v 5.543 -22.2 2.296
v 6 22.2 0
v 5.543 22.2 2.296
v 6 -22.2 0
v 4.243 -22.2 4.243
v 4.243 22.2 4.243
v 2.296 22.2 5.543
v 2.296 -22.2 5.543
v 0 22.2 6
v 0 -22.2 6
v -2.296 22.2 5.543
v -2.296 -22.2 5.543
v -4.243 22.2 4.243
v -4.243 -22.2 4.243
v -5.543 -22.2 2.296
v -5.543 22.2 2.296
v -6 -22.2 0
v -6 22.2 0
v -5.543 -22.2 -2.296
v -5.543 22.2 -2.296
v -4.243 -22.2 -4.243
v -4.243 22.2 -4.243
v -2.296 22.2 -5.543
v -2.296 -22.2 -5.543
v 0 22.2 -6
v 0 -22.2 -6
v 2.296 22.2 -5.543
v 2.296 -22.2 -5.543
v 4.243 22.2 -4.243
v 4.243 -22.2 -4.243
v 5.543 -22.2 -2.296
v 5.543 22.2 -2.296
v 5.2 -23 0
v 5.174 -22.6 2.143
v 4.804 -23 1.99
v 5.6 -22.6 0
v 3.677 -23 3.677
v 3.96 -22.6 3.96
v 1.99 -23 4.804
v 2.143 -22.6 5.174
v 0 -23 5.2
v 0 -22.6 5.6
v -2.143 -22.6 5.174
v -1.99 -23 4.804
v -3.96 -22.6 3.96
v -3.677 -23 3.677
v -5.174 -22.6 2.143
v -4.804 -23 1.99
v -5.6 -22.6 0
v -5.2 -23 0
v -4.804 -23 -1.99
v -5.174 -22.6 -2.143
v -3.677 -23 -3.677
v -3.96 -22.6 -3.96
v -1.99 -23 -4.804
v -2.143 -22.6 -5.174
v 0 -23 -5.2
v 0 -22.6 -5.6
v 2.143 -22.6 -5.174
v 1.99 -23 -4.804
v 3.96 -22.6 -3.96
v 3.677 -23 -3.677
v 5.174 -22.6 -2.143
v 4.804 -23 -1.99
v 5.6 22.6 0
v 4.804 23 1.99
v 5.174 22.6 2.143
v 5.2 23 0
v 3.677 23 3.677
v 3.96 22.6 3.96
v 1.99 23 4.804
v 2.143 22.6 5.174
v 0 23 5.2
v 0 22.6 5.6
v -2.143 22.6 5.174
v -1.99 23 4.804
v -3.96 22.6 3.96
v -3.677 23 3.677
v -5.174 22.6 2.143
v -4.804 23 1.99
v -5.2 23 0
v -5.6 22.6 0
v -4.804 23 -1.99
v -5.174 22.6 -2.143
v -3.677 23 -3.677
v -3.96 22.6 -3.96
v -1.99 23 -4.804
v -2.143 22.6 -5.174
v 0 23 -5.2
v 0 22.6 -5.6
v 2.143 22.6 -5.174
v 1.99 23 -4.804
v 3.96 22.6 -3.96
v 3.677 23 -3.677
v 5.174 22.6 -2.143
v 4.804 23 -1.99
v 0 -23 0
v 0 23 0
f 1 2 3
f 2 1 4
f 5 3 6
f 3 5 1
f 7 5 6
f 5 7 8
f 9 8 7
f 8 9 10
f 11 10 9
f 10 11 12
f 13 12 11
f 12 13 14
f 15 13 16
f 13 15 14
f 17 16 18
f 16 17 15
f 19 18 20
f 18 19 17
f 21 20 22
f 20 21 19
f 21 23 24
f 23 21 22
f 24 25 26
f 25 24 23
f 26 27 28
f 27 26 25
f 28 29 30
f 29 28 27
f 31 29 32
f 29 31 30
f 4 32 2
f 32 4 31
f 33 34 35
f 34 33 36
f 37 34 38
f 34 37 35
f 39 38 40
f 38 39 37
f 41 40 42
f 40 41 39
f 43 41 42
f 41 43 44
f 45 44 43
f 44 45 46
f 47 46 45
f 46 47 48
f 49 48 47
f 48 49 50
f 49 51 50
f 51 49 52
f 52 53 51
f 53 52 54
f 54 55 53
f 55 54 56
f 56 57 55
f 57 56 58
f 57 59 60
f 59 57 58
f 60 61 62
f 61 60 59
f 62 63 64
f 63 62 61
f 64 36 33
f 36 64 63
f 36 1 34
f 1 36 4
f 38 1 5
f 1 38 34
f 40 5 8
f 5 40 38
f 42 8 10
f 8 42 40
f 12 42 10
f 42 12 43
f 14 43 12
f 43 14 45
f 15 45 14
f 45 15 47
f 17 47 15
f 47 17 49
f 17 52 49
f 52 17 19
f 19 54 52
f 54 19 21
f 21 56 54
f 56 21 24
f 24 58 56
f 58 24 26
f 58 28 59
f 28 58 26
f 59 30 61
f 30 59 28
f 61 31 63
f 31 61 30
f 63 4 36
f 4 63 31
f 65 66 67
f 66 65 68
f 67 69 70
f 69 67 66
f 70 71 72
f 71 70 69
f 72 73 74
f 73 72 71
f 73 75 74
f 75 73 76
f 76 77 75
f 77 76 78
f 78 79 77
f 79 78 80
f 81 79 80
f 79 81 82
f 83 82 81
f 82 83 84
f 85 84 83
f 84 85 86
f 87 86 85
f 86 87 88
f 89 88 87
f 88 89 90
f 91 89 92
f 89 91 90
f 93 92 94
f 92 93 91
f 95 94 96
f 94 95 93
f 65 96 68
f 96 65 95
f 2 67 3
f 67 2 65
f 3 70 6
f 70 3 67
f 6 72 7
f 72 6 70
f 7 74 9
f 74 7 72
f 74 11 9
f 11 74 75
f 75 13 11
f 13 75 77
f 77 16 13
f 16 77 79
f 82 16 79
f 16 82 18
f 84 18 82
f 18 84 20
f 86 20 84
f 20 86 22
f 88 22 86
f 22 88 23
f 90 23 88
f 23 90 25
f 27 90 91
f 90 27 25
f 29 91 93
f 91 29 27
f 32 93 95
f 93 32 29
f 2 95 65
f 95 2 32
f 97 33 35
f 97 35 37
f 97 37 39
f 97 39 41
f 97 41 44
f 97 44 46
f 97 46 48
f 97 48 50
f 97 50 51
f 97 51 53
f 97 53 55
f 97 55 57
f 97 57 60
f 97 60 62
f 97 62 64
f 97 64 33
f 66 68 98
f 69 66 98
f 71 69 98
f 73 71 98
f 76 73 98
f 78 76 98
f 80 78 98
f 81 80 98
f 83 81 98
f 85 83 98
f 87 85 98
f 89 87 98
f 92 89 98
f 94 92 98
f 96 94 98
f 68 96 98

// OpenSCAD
// file: ../p/4-4cyli.scad
use <../lib.scad>
function ldraw_lib__4_4cyli() = [
// 0 Cylinder 1.0
// 0 Name: 4-4cyli.dat
// 0 Author: James Jessiman
// 0 !LDRAW_ORG Primitive UPDATE 2005-01
// 0 !LICENSE Licensed under CC BY 2.0 and CC BY 4.0 : see CAreadme.txt
// 
// 0 BFC CERTIFY CCW
  [0,"BFC","CERTIFY"],
  [0,"BFC","CCW"],
// 
// 0 !HISTORY 1998-12-15 [PTadmin] Official Update 1998-10
// 0 !HISTORY 2002-03-23 [sbliss] Added BFC statement; merged headers from files in distributions LDraw 0.27 and Complete.
// 0 !HISTORY 2002-04-25 [PTadmin] Official Update 2002-02
// 0 !HISTORY 2004-12-14 [guyvivan] BFC CCW
// 0 !HISTORY 2005-12-28 [PTadmin] Official Update 2005-01
// 0 !HISTORY 2007-06-24 [PTadmin] Header formatted for Contributor Agreement
// 0 !HISTORY 2008-07-01 [PTadmin] Official Update 2008-01
// 
// 
// 4 16 1 1 0 0.9239 1 0.3827 0.9239 0 0.3827 1 0 0
  [4,16,1,1,0,0.9239,1,0.3827,0.9239,0,0.3827,1,0,0],
// 5 24 1 0 0 1 1 0 0.9239 0 0.3827 0.9239 0 -0.3827
  [5,24,1,0,0,1,1,0,0.9239,0,0.3827,0.9239,0,-0.3827],
// 4 16 0.9239 1 0.3827 0.7071 1 0.7071 0.7071 0 0.7071 0.9239 0 0.3827
  [4,16,0.9239,1,0.3827,0.7071,1,0.7071,0.7071,0,0.7071,0.9239,0,0.3827],
// 5 24 0.9239 0 0.3827 0.9239 1 0.3827 0.7071 0 0.7071 1 0 0
  [5,24,0.9239,0,0.3827,0.9239,1,0.3827,0.7071,0,0.7071,1,0,0],
// 4 16 0.7071 1 0.7071 0.3827 1 0.9239 0.3827 0 0.9239 0.7071 0 0.7071
  [4,16,0.7071,1,0.7071,0.3827,1,0.9239,0.3827,0,0.9239,0.7071,0,0.7071],
// 5 24 0.7071 0 0.7071 0.7071 1 0.7071 0.3827 0 0.9239 0.9239 0 0.3827
  [5,24,0.7071,0,0.7071,0.7071,1,0.7071,0.3827,0,0.9239,0.9239,0,0.3827],
// 4 16 0.3827 1 0.9239 0 1 1 0 0 1 0.3827 0 0.9239
  [4,16,0.3827,1,0.9239,0,1,1,0,0,1,0.3827,0,0.9239],
// 5 24 0.3827 0 0.9239 0.3827 1 0.9239 0 0 1 0.7071 0 0.7071
  [5,24,0.3827,0,0.9239,0.3827,1,0.9239,0,0,1,0.7071,0,0.7071],
// 4 16 0 1 1 -0.3827 1 0.9239 -0.3827 0 0.9239 0 0 1
  [4,16,0,1,1,-0.3827,1,0.9239,-0.3827,0,0.9239,0,0,1],
// 5 24 0 0 1 0 1 1 -0.3827 0 0.9239 0.3827 0 0.9239
  [5,24,0,0,1,0,1,1,-0.3827,0,0.9239,0.3827,0,0.9239],
// 4 16 -0.3827 1 0.9239 -0.7071 1 0.7071 -0.7071 0 0.7071 -0.3827 0 0.9239
  [4,16,-0.3827,1,0.9239,-0.7071,1,0.7071,-0.7071,0,0.7071,-0.3827,0,0.9239],
// 5 24 -0.3827 0 0.9239 -0.3827 1 0.9239 -0.7071 0 0.7071 0 0 1
  [5,24,-0.3827,0,0.9239,-0.3827,1,0.9239,-0.7071,0,0.7071,0,0,1],
// 4 16 -0.7071 1 0.7071 -0.9239 1 0.3827 -0.9239 0 0.3827 -0.7071 0 0.7071
  [4,16,-0.7071,1,0.7071,-0.9239,1,0.3827,-0.9239,0,0.3827,-0.7071,0,0.7071],
// 5 24 -0.7071 0 0.7071 -0.7071 1 0.7071 -0.9239 0 0.3827 -0.3827 0 0.9239
  [5,24,-0.7071,0,0.7071,-0.7071,1,0.7071,-0.9239,0,0.3827,-0.3827,0,0.9239],
// 4 16 -0.9239 1 0.3827 -1 1 0 -1 0 0 -0.9239 0 0.3827
  [4,16,-0.9239,1,0.3827,-1,1,0,-1,0,0,-0.9239,0,0.3827],
// 5 24 -0.9239 0 0.3827 -0.9239 1 0.3827 -1 0 0 -0.7071 0 0.7071
  [5,24,-0.9239,0,0.3827,-0.9239,1,0.3827,-1,0,0,-0.7071,0,0.7071],
// 4 16 -1 1 0 -0.9239 1 -0.3827 -0.9239 0 -0.3827 -1 0 0
  [4,16,-1,1,0,-0.9239,1,-0.3827,-0.9239,0,-0.3827,-1,0,0],
// 5 24 -1 0 0 -1 1 0 -0.9239 0 -0.3827 -0.9239 0 0.3827
  [5,24,-1,0,0,-1,1,0,-0.9239,0,-0.3827,-0.9239,0,0.3827],
// 4 16 -0.9239 1 -0.3827 -0.7071 1 -0.7071 -0.7071 0 -0.7071 -0.9239 0 -0.3827
  [4,16,-0.9239,1,-0.3827,-0.7071,1,-0.7071,-0.7071,0,-0.7071,-0.9239,0,-0.3827],
// 5 24 -0.9239 0 -0.3827 -0.9239 1 -0.3827 -0.7071 0 -0.7071 -1 0 0
  [5,24,-0.9239,0,-0.3827,-0.9239,1,-0.3827,-0.7071,0,-0.7071,-1,0,0],
// 4 16 -0.7071 1 -0.7071 -0.3827 1 -0.9239 -0.3827 0 -0.9239 -0.7071 0 -0.7071
  [4,16,-0.7071,1,-0.7071,-0.3827,1,-0.9239,-0.3827,0,-0.9239,-0.7071,0,-0.7071],
// 5 24 -0.7071 0 -0.7071 -0.7071 1 -0.7071 -0.3827 0 -0.9239 -0.9239 0 -0.3827
  [5,24,-0.7071,0,-0.7071,-0.7071,1,-0.7071,-0.3827,0,-0.9239,-0.9239,0,-0.3827],
// 4 16 -0.3827 1 -0.9239 0 1 -1 0 0 -1 -0.3827 0 -0.9239
  [4,16,-0.3827,1,-0.9239,0,1,-1,0,0,-1,-0.3827,0,-0.9239],
// 5 24 -0.3827 0 -0.9239 -0.3827 1 -0.9239 0 0 -1 -0.7071 0 -0.7071
  [5,24,-0.3827,0,-0.9239,-0.3827,1,-0.9239,0,0,-1,-0.7071,0,-0.7071],
// 4 16 0 1 -1 0.3827 1 -0.9239 0.3827 0 -0.9239 0 0 -1
  [4,16,0,1,-1,0.3827,1,-0.9239,0.3827,0,-0.9239,0,0,-1],
// 5 24 0 0 -1 0 1 -1 0.3827 0 -0.9239 -0.3827 0 -0.9239
  [5,24,0,0,-1,0,1,-1,0.3827,0,-0.9239,-0.3827,0,-0.9239],
// 4 16 0.3827 1 -0.9239 0.7071 1 -0.7071 0.7071 0 -0.7071 0.3827 0 -0.9239
  [4,16,0.3827,1,-0.9239,0.7071,1,-0.7071,0.7071,0,-0.7071,0.3827,0,-0.9239],
// 5 24 0.3827 0 -0.9239 0.3827 1 -0.9239 0.7071 0 -0.7071 0 0 -1
  [5,24,0.3827,0,-0.9239,0.3827,1,-0.9239,0.7071,0,-0.7071,0,0,-1],
// 4 16 0.7071 1 -0.7071 0.9239 1 -0.3827 0.9239 0 -0.3827 0.7071 0 -0.7071
  [4,16,0.7071,1,-0.7071,0.9239,1,-0.3827,0.9239,0,-0.3827,0.7071,0,-0.7071],
// 5 24 0.7071 0 -0.7071 0.7071 1 -0.7071 0.9239 0 -0.3827 0.3827 0 -0.9239
  [5,24,0.7071,0,-0.7071,0.7071,1,-0.7071,0.9239,0,-0.3827,0.3827,0,-0.9239],
// 4 16 0.9239 1 -0.3827 1 1 0 1 0 0 0.9239 0 -0.3827
  [4,16,0.9239,1,-0.3827,1,1,0,1,0,0,0.9239,0,-0.3827],
// 5 24 0.9239 0 -0.3827 0.9239 1 -0.3827 1 0 0 0.7071 0 -0.7071
  [5,24,0.9239,0,-0.3827,0.9239,1,-0.3827,1,0,0,0.7071,0,-0.7071],
// 0
];
module ldraw_lib__4_4cyli(step=0, col=false, unit=2/5, alt=false, line=0.2, solid=!$preview)
    makepoly(ldraw_lib__4_4cyli(), step=step, col=col, unit=unit, alt=alt, line=line, solid=solid);
ldraw_lib__4_4cyli(line=0.2);
// file: ../p/4-4edge.scad
use <../lib.scad>
function ldraw_lib__4_4edge() = [
// 0 Circle 1.0
// 0 Name: 4-4edge.dat
// 0 Author: James Jessiman
// 0 !LDRAW_ORG Primitive UPDATE 2017-01
// 0 !LICENSE Licensed under CC BY 2.0 and CC BY 4.0 : see CAreadme.txt
// 
// 0 BFC CERTIFY CCW
  [0,"BFC","CERTIFY"],
  [0,"BFC","CCW"],
// 
// 0 !HISTORY 1998-12-15 [PTadmin] Official Update 1998-10
// 0 !HISTORY 2005-12-28 [PTadmin] Official Update 2005-01
// 0 !HISTORY 2007-06-24 [PTadmin] Header formatted for Contributor Agreement
// 0 !HISTORY 2008-07-01 [PTadmin] Official Update 2008-01
// 0 !HISTORY 2017-01-15 [Steffen] BFCed
// 0 !HISTORY 2017-12-30 [PTadmin] Official Update 2017-01
// 
// 
// 2 24 1 0 0 0.9239 0 0.3827
  [2,24,1,0,0,0.9239,0,0.3827],
// 2 24 0.9239 0 0.3827 0.7071 0 0.7071
  [2,24,0.9239,0,0.3827,0.7071,0,0.7071],
// 2 24 0.7071 0 0.7071 0.3827 0 0.9239
  [2,24,0.7071,0,0.7071,0.3827,0,0.9239],
// 2 24 0.3827 0 0.9239 0 0 1
  [2,24,0.3827,0,0.9239,0,0,1],
// 2 24 0 0 1 -0.3827 0 0.9239
  [2,24,0,0,1,-0.3827,0,0.9239],
// 2 24 -0.3827 0 0.9239 -0.7071 0 0.7071
  [2,24,-0.3827,0,0.9239,-0.7071,0,0.7071],
// 2 24 -0.7071 0 0.7071 -0.9239 0 0.3827
  [2,24,-0.7071,0,0.7071,-0.9239,0,0.3827],
// 2 24 -0.9239 0 0.3827 -1 0 -0
  [2,24,-0.9239,0,0.3827,-1,0,-0],
// 2 24 -1 0 -0 -0.9239 0 -0.3827
  [2,24,-1,0,-0,-0.9239,0,-0.3827],
// 2 24 -0.9239 0 -0.3827 -0.7071 0 -0.7071
  [2,24,-0.9239,0,-0.3827,-0.7071,0,-0.7071],
// 2 24 -0.7071 0 -0.7071 -0.3827 0 -0.9239
  [2,24,-0.7071,0,-0.7071,-0.3827,0,-0.9239],
// 2 24 -0.3827 0 -0.9239 0 0 -1
  [2,24,-0.3827,0,-0.9239,0,0,-1],
// 2 24 0 0 -1 0.3827 0 -0.9239
  [2,24,0,0,-1,0.3827,0,-0.9239],
// 2 24 0.3827 0 -0.9239 0.7071 0 -0.7071
  [2,24,0.3827,0,-0.9239,0.7071,0,-0.7071],
// 2 24 0.7071 0 -0.7071 0.9239 0 -0.3827
  [2,24,0.7071,0,-0.7071,0.9239,0,-0.3827],
// 2 24 0.9239 0 -0.3827 1 0 0
  [2,24,0.9239,0,-0.3827,1,0,0],
];
module ldraw_lib__4_4edge(step=0, col=false, unit=2/5, alt=false, line=0.2, solid=!$preview)
    makepoly(ldraw_lib__4_4edge(), step=step, col=col, unit=unit, alt=alt, line=line, solid=solid);
ldraw_lib__4_4edge(line=0.2);
// file: ../p/4-4disc.scad
use <../lib.scad>
function ldraw_lib__4_4disc() = [
// 0 Disc 1.0
// 0 Name: 4-4disc.dat
// 0 Author: James Jessiman
// 0 !LDRAW_ORG Primitive UPDATE 2002-02
// 0 !LICENSE Licensed under CC BY 2.0 and CC BY 4.0 : see CAreadme.txt
// 
// 0 BFC CERTIFY CCW
  [0,"BFC","CERTIFY"],
  [0,"BFC","CCW"],
// 
// 0 !HISTORY 1998-12-15 [PTadmin] Official Update 1998-10
// 0 !HISTORY 2002-03-23 [sbliss] Added BFC statement
// 0 !HISTORY 2002-04-25 [PTadmin] Official Update 2002-02
// 0 !HISTORY 2007-06-24 [PTadmin] Header formatted for Contributor Agreement
// 0 !HISTORY 2008-07-01 [PTadmin] Official Update 2008-01
// 
// 
// 3 16 0 0 0 1 0 0 0.9239 0 0.3827
  [3,16,0,0,0,1,0,0,0.9239,0,0.3827],
// 3 16 0 0 0 0.9239 0 0.3827 0.7071 0 0.7071
  [3,16,0,0,0,0.9239,0,0.3827,0.7071,0,0.7071],
// 3 16 0 0 0 0.7071 0 0.7071 0.3827 0 0.9239
  [3,16,0,0,0,0.7071,0,0.7071,0.3827,0,0.9239],
// 3 16 0 0 0 0.3827 0 0.9239 0 0 1
  [3,16,0,0,0,0.3827,0,0.9239,0,0,1],
// 3 16 0 0 0 0 0 1 -0.3827 0 0.9239
  [3,16,0,0,0,0,0,1,-0.3827,0,0.9239],
// 3 16 0 0 0 -0.3827 0 0.9239 -0.7071 0 0.7071
  [3,16,0,0,0,-0.3827,0,0.9239,-0.7071,0,0.7071],
// 3 16 0 0 0 -0.7071 0 0.7071 -0.9239 0 0.3827
  [3,16,0,0,0,-0.7071,0,0.7071,-0.9239,0,0.3827],
// 3 16 0 0 0 -0.9239 0 0.3827 -1 0 -0
  [3,16,0,0,0,-0.9239,0,0.3827,-1,0,-0],
// 3 16 0 0 0 -1 0 -0 -0.9239 0 -0.3827
  [3,16,0,0,0,-1,0,-0,-0.9239,0,-0.3827],
// 3 16 0 0 0 -0.9239 0 -0.3827 -0.7071 0 -0.7071
  [3,16,0,0,0,-0.9239,0,-0.3827,-0.7071,0,-0.7071],
// 3 16 0 0 0 -0.7071 0 -0.7071 -0.3827 0 -0.9239
  [3,16,0,0,0,-0.7071,0,-0.7071,-0.3827,0,-0.9239],
// 3 16 0 0 0 -0.3827 0 -0.9239 0 0 -1
  [3,16,0,0,0,-0.3827,0,-0.9239,0,0,-1],
// 3 16 0 0 0 0 0 -1 0.3827 0 -0.9239
  [3,16,0,0,0,0,0,-1,0.3827,0,-0.9239],
// 3 16 0 0 0 0.3827 0 -0.9239 0.7071 0 -0.7071
  [3,16,0,0,0,0.3827,0,-0.9239,0.7071,0,-0.7071],
// 3 16 0 0 0 0.7071 0 -0.7071 0.9239 0 -0.3827
  [3,16,0,0,0,0.7071,0,-0.7071,0.9239,0,-0.3827],
// 3 16 0 0 0 0.9239 0 -0.3827 1 0 0
  [3,16,0,0,0,0.9239,0,-0.3827,1,0,0],
// 0
];
module ldraw_lib__4_4disc(step=0, col=false, unit=2/5, alt=false, line=0.2, solid=!$preview)
    makepoly(ldraw_lib__4_4disc(), step=step, col=col, unit=unit, alt=alt, line=line, solid=solid);
ldraw_lib__4_4disc(line=0.2);
// file: ../p/4-4cylo.scad
use <../lib.scad>
use <4-4cyli.scad>
use <4-4edge.scad>
function ldraw_lib__4_4cylo() = [
// 0 Cylinder Open 1.0
// 0 Name: 4-4cylo.dat
// 0 Author: Mark Kennedy [mkennedy]
// 0 !LDRAW_ORG Primitive UPDATE 2010-01
// 0 !LICENSE Licensed under CC BY 2.0 and CC BY 4.0 : see CAreadme.txt
// 
// 0 BFC CERTIFY CCW
  [0,"BFC","CERTIFY"],
  [0,"BFC","CCW"],
// 
// 0 !HISTORY 2010-04-05 [PTadmin] Official Update 2010-01
// 
// 
// 1 16 0 0 0 1 0 0 0 1 0 0 0 1 4-4edge.dat
  [1,16,0,0,0,1,0,0,0,1,0,0,0,1, ldraw_lib__4_4edge()],
// 1 16 0 1 0 1 0 0 0 1 0 0 0 1 4-4edge.dat
  [1,16,0,1,0,1,0,0,0,1,0,0,0,1, ldraw_lib__4_4edge()],
// 1 16 0 0 0 1 0 0 0 1 0 0 0 1 4-4cyli.dat
  [1,16,0,0,0,1,0,0,0,1,0,0,0,1, ldraw_lib__4_4cyli()],
// 0
];
module ldraw_lib__4_4cylo(step=0, col=false, unit=2/5, alt=false, line=0.2, solid=!$preview)
    makepoly(ldraw_lib__4_4cylo(), step=step, col=col, unit=unit, alt=alt, line=line, solid=solid);
ldraw_lib__4_4cylo(line=0.2);
// file: ../p/4-4con14.scad
use <../lib.scad>
function ldraw_lib__4_4con14() = [
// 0 Cone 14 x 1.0
// 0 Name: 4-4con14.dat
// 0 Author: Niels Karsdorp [nielsk]
// 0 !LDRAW_ORG Primitive UPDATE 2010-02
// 0 !LICENSE Licensed under CC BY 2.0 and CC BY 4.0 : see CAreadme.txt
// 
// 0 BFC CERTIFY CCW
  [0,"BFC","CERTIFY"],
  [0,"BFC","CCW"],
// 
// 0 !HISTORY 2010-07-05 [PTadmin] Official Update 2010-02
// 
// 
// 5 24 14.0000 1 0.0000 15.0000 0 0.0000 12.9346 1 5.3578 12.9346 1 -5.3578
  [5,24,14.0000,1,0.0000,15.0000,0,0.0000,12.9346,1,5.3578,12.9346,1,-5.3578],
// 5 24 12.9346 1 5.3578 13.8585 0 5.7405 9.8994 1 9.8994 14.0000 1 0.0000
  [5,24,12.9346,1,5.3578,13.8585,0,5.7405,9.8994,1,9.8994,14.0000,1,0.0000],
// 5 24 9.8994 1 9.8994 10.6065 0 10.6065 5.3578 1 12.9346 12.9346 1 5.3578
  [5,24,9.8994,1,9.8994,10.6065,0,10.6065,5.3578,1,12.9346,12.9346,1,5.3578],
// 5 24 5.3578 1 12.9346 5.7405 0 13.8585 0.0000 1 14.0000 9.8994 1 9.8994
  [5,24,5.3578,1,12.9346,5.7405,0,13.8585,0.0000,1,14.0000,9.8994,1,9.8994],
// 5 24 0.0000 1 14.0000 0.0000 0 15.0000 -5.3578 1 12.9346 5.3578 1 12.9346
  [5,24,0.0000,1,14.0000,0.0000,0,15.0000,-5.3578,1,12.9346,5.3578,1,12.9346],
// 5 24 -5.3578 1 12.9346 -5.7405 0 13.8585 -9.8994 1 9.8994 0.0000 1 14.0000
  [5,24,-5.3578,1,12.9346,-5.7405,0,13.8585,-9.8994,1,9.8994,0.0000,1,14.0000],
// 5 24 -9.8994 1 9.8994 -10.6065 0 10.6065 -12.9346 1 5.3578 -5.3578 1 12.9346
  [5,24,-9.8994,1,9.8994,-10.6065,0,10.6065,-12.9346,1,5.3578,-5.3578,1,12.9346],
// 5 24 -12.9346 1 5.3578 -13.8585 0 5.7405 -14.0000 1 0.0000 -9.8994 1 9.8994
  [5,24,-12.9346,1,5.3578,-13.8585,0,5.7405,-14.0000,1,0.0000,-9.8994,1,9.8994],
// 5 24 -14.0000 1 0.0000 -15.0000 0 0.0000 -12.9346 1 -5.3578 -12.9346 1 5.3578
  [5,24,-14.0000,1,0.0000,-15.0000,0,0.0000,-12.9346,1,-5.3578,-12.9346,1,5.3578],
// 5 24 -12.9346 1 -5.3578 -13.8585 0 -5.7405 -9.8994 1 -9.8994 -14.0000 1 0.0000
  [5,24,-12.9346,1,-5.3578,-13.8585,0,-5.7405,-9.8994,1,-9.8994,-14.0000,1,0.0000],
// 5 24 -9.8994 1 -9.8994 -10.6065 0 -10.6065 -5.3578 1 -12.9346 -12.9346 1 -5.3578
  [5,24,-9.8994,1,-9.8994,-10.6065,0,-10.6065,-5.3578,1,-12.9346,-12.9346,1,-5.3578],
// 5 24 -5.3578 1 -12.9346 -5.7405 0 -13.8585 0.0000 1 -14.0000 -9.8994 1 -9.8994
  [5,24,-5.3578,1,-12.9346,-5.7405,0,-13.8585,0.0000,1,-14.0000,-9.8994,1,-9.8994],
// 5 24 0.0000 1 -14.0000 0.0000 0 -15.0000 5.3578 1 -12.9346 -5.3578 1 -12.9346
  [5,24,0.0000,1,-14.0000,0.0000,0,-15.0000,5.3578,1,-12.9346,-5.3578,1,-12.9346],
// 5 24 5.3578 1 -12.9346 5.7405 0 -13.8585 9.8994 1 -9.8994 0.0000 1 -14.0000
  [5,24,5.3578,1,-12.9346,5.7405,0,-13.8585,9.8994,1,-9.8994,0.0000,1,-14.0000],
// 5 24 9.8994 1 -9.8994 10.6065 0 -10.6065 12.9346 1 -5.3578 5.3578 1 -12.9346
  [5,24,9.8994,1,-9.8994,10.6065,0,-10.6065,12.9346,1,-5.3578,5.3578,1,-12.9346],
// 5 24 12.9346 1 -5.3578 13.8585 0 -5.7405 14.0000 1 0.0000 9.8994 1 -9.8994
  [5,24,12.9346,1,-5.3578,13.8585,0,-5.7405,14.0000,1,0.0000,9.8994,1,-9.8994],
// 
// 4 16 14.0000 1 0.0000 12.9346 1 5.3578 13.8585 0 5.7405 15.0000 0 0.0000
  [4,16,14.0000,1,0.0000,12.9346,1,5.3578,13.8585,0,5.7405,15.0000,0,0.0000],
// 4 16 12.9346 1 5.3578 9.8994 1 9.8994 10.6065 0 10.6065 13.8585 0 5.7405
  [4,16,12.9346,1,5.3578,9.8994,1,9.8994,10.6065,0,10.6065,13.8585,0,5.7405],
// 4 16 9.8994 1 9.8994 5.3578 1 12.9346 5.7405 0 13.8585 10.6065 0 10.6065
  [4,16,9.8994,1,9.8994,5.3578,1,12.9346,5.7405,0,13.8585,10.6065,0,10.6065],
// 4 16 5.3578 1 12.9346 0.0000 1 14.0000 0.0000 0 15.0000 5.7405 0 13.8585
  [4,16,5.3578,1,12.9346,0.0000,1,14.0000,0.0000,0,15.0000,5.7405,0,13.8585],
// 4 16 0.0000 1 14.0000 -5.3578 1 12.9346 -5.7405 0 13.8585 0.0000 0 15.0000
  [4,16,0.0000,1,14.0000,-5.3578,1,12.9346,-5.7405,0,13.8585,0.0000,0,15.0000],
// 4 16 -5.3578 1 12.9346 -9.8994 1 9.8994 -10.6065 0 10.6065 -5.7405 0 13.8585
  [4,16,-5.3578,1,12.9346,-9.8994,1,9.8994,-10.6065,0,10.6065,-5.7405,0,13.8585],
// 4 16 -9.8994 1 9.8994 -12.9346 1 5.3578 -13.8585 0 5.7405 -10.6065 0 10.6065
  [4,16,-9.8994,1,9.8994,-12.9346,1,5.3578,-13.8585,0,5.7405,-10.6065,0,10.6065],
// 4 16 -12.9346 1 5.3578 -14.0000 1 0.0000 -15.0000 0 0.0000 -13.8585 0 5.7405
  [4,16,-12.9346,1,5.3578,-14.0000,1,0.0000,-15.0000,0,0.0000,-13.8585,0,5.7405],
// 4 16 -14.0000 1 0.0000 -12.9346 1 -5.3578 -13.8585 0 -5.7405 -15.0000 0 0.0000
  [4,16,-14.0000,1,0.0000,-12.9346,1,-5.3578,-13.8585,0,-5.7405,-15.0000,0,0.0000],
// 4 16 -12.9346 1 -5.3578 -9.8994 1 -9.8994 -10.6065 0 -10.6065 -13.8585 0 -5.7405
  [4,16,-12.9346,1,-5.3578,-9.8994,1,-9.8994,-10.6065,0,-10.6065,-13.8585,0,-5.7405],
// 4 16 -9.8994 1 -9.8994 -5.3578 1 -12.9346 -5.7405 0 -13.8585 -10.6065 0 -10.6065
  [4,16,-9.8994,1,-9.8994,-5.3578,1,-12.9346,-5.7405,0,-13.8585,-10.6065,0,-10.6065],
// 4 16 -5.3578 1 -12.9346 0.0000 1 -14.0000 0.0000 0 -15.0000 -5.7405 0 -13.8585
  [4,16,-5.3578,1,-12.9346,0.0000,1,-14.0000,0.0000,0,-15.0000,-5.7405,0,-13.8585],
// 4 16 0.0000 1 -14.0000 5.3578 1 -12.9346 5.7405 0 -13.8585 0.0000 0 -15.0000
  [4,16,0.0000,1,-14.0000,5.3578,1,-12.9346,5.7405,0,-13.8585,0.0000,0,-15.0000],
// 4 16 5.3578 1 -12.9346 9.8994 1 -9.8994 10.6065 0 -10.6065 5.7405 0 -13.8585
  [4,16,5.3578,1,-12.9346,9.8994,1,-9.8994,10.6065,0,-10.6065,5.7405,0,-13.8585],
// 4 16 9.8994 1 -9.8994 12.9346 1 -5.3578 13.8585 0 -5.7405 10.6065 0 -10.6065
  [4,16,9.8994,1,-9.8994,12.9346,1,-5.3578,13.8585,0,-5.7405,10.6065,0,-10.6065],
// 4 16 12.9346 1 -5.3578 14.0000 1 0.0000 15.0000 0 0.0000 13.8585 0 -5.7405
  [4,16,12.9346,1,-5.3578,14.0000,1,0.0000,15.0000,0,0.0000,13.8585,0,-5.7405],
// 
// 0
];
module ldraw_lib__4_4con14(step=0, col=false, unit=2/5, alt=false, line=0.2, solid=!$preview)
    makepoly(ldraw_lib__4_4con14(), step=step, col=col, unit=unit, alt=alt, line=line, solid=solid);
ldraw_lib__4_4con14(line=0.2);
// file: ../p/4-4con13.scad
use <../lib.scad>
function ldraw_lib__4_4con13() = [
// 0 Cone 13 x 1.0
// 0 Name: 4-4con13.dat
// 0 Author: Michael Heidemann [mikeheide]
// 0 !LDRAW_ORG Primitive UPDATE 2010-02
// 0 !LICENSE Licensed under CC BY 2.0 and CC BY 4.0 : see CAreadme.txt
// 
// 0 BFC CERTIFY CCW
  [0,"BFC","CERTIFY"],
  [0,"BFC","CCW"],
// 
// 0 !HISTORY 2010-07-05 [PTadmin] Official Update 2010-02
// 
// 
// 4 16 13 1 0 12.0107 1 4.9751 12.9346 0 5.3578 14 0 0
  [4,16,13,1,0,12.0107,1,4.9751,12.9346,0,5.3578,14,0,0],
// 4 16 12.0107 1 4.9751 9.1923 1 9.1923 9.8994 0 9.8994 12.9346 0 5.3578
  [4,16,12.0107,1,4.9751,9.1923,1,9.1923,9.8994,0,9.8994,12.9346,0,5.3578],
// 4 16 9.1923 1 9.1923 4.9751 1 12.0107 5.3578 0 12.9346 9.8994 0 9.8994
  [4,16,9.1923,1,9.1923,4.9751,1,12.0107,5.3578,0,12.9346,9.8994,0,9.8994],
// 4 16 4.9751 1 12.0107 0 1 13 0 0 14 5.3578 0 12.9346
  [4,16,4.9751,1,12.0107,0,1,13,0,0,14,5.3578,0,12.9346],
// 4 16 0 1 13 -4.9751 1 12.0107 -5.3578 0 12.9346 0 0 14
  [4,16,0,1,13,-4.9751,1,12.0107,-5.3578,0,12.9346,0,0,14],
// 4 16 -4.9751 1 12.0107 -9.1923 1 9.1923 -9.8994 0 9.8994 -5.3578 0 12.9346
  [4,16,-4.9751,1,12.0107,-9.1923,1,9.1923,-9.8994,0,9.8994,-5.3578,0,12.9346],
// 4 16 -9.1923 1 9.1923 -12.0107 1 4.9751 -12.9346 0 5.3578 -9.8994 0 9.8994
  [4,16,-9.1923,1,9.1923,-12.0107,1,4.9751,-12.9346,0,5.3578,-9.8994,0,9.8994],
// 4 16 -12.0107 1 4.9751 -13 1 0 -14 0 0 -12.9346 0 5.3578
  [4,16,-12.0107,1,4.9751,-13,1,0,-14,0,0,-12.9346,0,5.3578],
// 4 16 -13 1 0 -12.0107 1 -4.9751 -12.9346 0 -5.3578 -14 0 0
  [4,16,-13,1,0,-12.0107,1,-4.9751,-12.9346,0,-5.3578,-14,0,0],
// 4 16 -12.0107 1 -4.9751 -9.1923 1 -9.1923 -9.8994 0 -9.8994 -12.9346 0 -5.3578
  [4,16,-12.0107,1,-4.9751,-9.1923,1,-9.1923,-9.8994,0,-9.8994,-12.9346,0,-5.3578],
// 4 16 -9.1923 1 -9.1923 -4.9751 1 -12.0107 -5.3578 0 -12.9346 -9.8994 0 -9.8994
  [4,16,-9.1923,1,-9.1923,-4.9751,1,-12.0107,-5.3578,0,-12.9346,-9.8994,0,-9.8994],
// 4 16 -4.9751 1 -12.0107 0 1 -13 0 0 -14 -5.3578 0 -12.9346
  [4,16,-4.9751,1,-12.0107,0,1,-13,0,0,-14,-5.3578,0,-12.9346],
// 4 16 0 1 -13 4.9751 1 -12.0107 5.3578 0 -12.9346 0 0 -14
  [4,16,0,1,-13,4.9751,1,-12.0107,5.3578,0,-12.9346,0,0,-14],
// 4 16 4.9751 1 -12.0107 9.1923 1 -9.1923 9.8994 0 -9.8994 5.3578 0 -12.9346
  [4,16,4.9751,1,-12.0107,9.1923,1,-9.1923,9.8994,0,-9.8994,5.3578,0,-12.9346],
// 4 16 9.1923 1 -9.1923 12.0107 1 -4.9751 12.9346 0 -5.3578 9.8994 0 -9.8994
  [4,16,9.1923,1,-9.1923,12.0107,1,-4.9751,12.9346,0,-5.3578,9.8994,0,-9.8994],
// 4 16 12.0107 1 -4.9751 13 1 0 14 0 0 12.9346 0 -5.3578
  [4,16,12.0107,1,-4.9751,13,1,0,14,0,0,12.9346,0,-5.3578],
// 
// 0 conditional lines
// 5 24 13 1 0 14 0 0 12.0107 1 -4.9751 12.0107 1 4.9751
  [5,24,13,1,0,14,0,0,12.0107,1,-4.9751,12.0107,1,4.9751],
// 5 24 12.0107 1 4.9751 12.9346 0 5.3578 13 1 0 9.1923 1 9.1923
  [5,24,12.0107,1,4.9751,12.9346,0,5.3578,13,1,0,9.1923,1,9.1923],
// 5 24 9.1923 1 9.1923 9.8994 0 9.8994 12.0107 1 4.9751 4.9751 1 12.0107
  [5,24,9.1923,1,9.1923,9.8994,0,9.8994,12.0107,1,4.9751,4.9751,1,12.0107],
// 5 24 4.9751 1 12.0107 5.3578 0 12.9346 9.1923 1 9.1923 0 1 13
  [5,24,4.9751,1,12.0107,5.3578,0,12.9346,9.1923,1,9.1923,0,1,13],
// 5 24 0 1 13 0 0 14 4.9751 1 12.0107 -4.9751 1 12.0107
  [5,24,0,1,13,0,0,14,4.9751,1,12.0107,-4.9751,1,12.0107],
// 5 24 -4.9751 1 12.0107 -5.3578 0 12.9346 0 1 13 -9.1923 1 9.1923
  [5,24,-4.9751,1,12.0107,-5.3578,0,12.9346,0,1,13,-9.1923,1,9.1923],
// 5 24 -9.1923 1 9.1923 -9.8994 0 9.8994 -4.9751 1 12.0107 -12.0107 1 4.9751
  [5,24,-9.1923,1,9.1923,-9.8994,0,9.8994,-4.9751,1,12.0107,-12.0107,1,4.9751],
// 5 24 -12.0107 1 4.9751 -12.9346 0 5.3578 -9.1923 1 9.1923 -13 1 0
  [5,24,-12.0107,1,4.9751,-12.9346,0,5.3578,-9.1923,1,9.1923,-13,1,0],
// 5 24 -13 1 0 -14 0 0 -12.0107 1 4.9751 -12.0107 1 -4.9751
  [5,24,-13,1,0,-14,0,0,-12.0107,1,4.9751,-12.0107,1,-4.9751],
// 5 24 -12.0107 1 -4.9751 -12.9346 0 -5.3578 -13 1 0 -9.1923 1 -9.1923
  [5,24,-12.0107,1,-4.9751,-12.9346,0,-5.3578,-13,1,0,-9.1923,1,-9.1923],
// 5 24 -9.1923 1 -9.1923 -9.8994 0 -9.8994 -12.0107 1 -4.9751 -4.9751 1 -12.0107
  [5,24,-9.1923,1,-9.1923,-9.8994,0,-9.8994,-12.0107,1,-4.9751,-4.9751,1,-12.0107],
// 5 24 -4.9751 1 -12.0107 -5.3578 0 -12.9346 -9.1923 1 -9.1923 0 1 -13
  [5,24,-4.9751,1,-12.0107,-5.3578,0,-12.9346,-9.1923,1,-9.1923,0,1,-13],
// 5 24 0 1 -13 0 0 -14 -4.9751 1 -12.0107 4.9751 1 -12.0107
  [5,24,0,1,-13,0,0,-14,-4.9751,1,-12.0107,4.9751,1,-12.0107],
// 5 24 4.9751 1 -12.0107 5.3578 0 -12.9346 0 1 -13 9.1923 1 -9.1923
  [5,24,4.9751,1,-12.0107,5.3578,0,-12.9346,0,1,-13,9.1923,1,-9.1923],
// 5 24 9.1923 1 -9.1923 9.8994 0 -9.8994 4.9751 1 -12.0107 12.0107 1 -4.9751
  [5,24,9.1923,1,-9.1923,9.8994,0,-9.8994,4.9751,1,-12.0107,12.0107,1,-4.9751],
// 5 24 12.0107 1 -4.9751 12.9346 0 -5.3578 9.1923 1 -9.1923 13 1 0
  [5,24,12.0107,1,-4.9751,12.9346,0,-5.3578,9.1923,1,-9.1923,13,1,0],
// 
// 0 end of file
// 
];
module ldraw_lib__4_4con13(step=0, col=false, unit=2/5, alt=false, line=0.2, solid=!$preview)
    makepoly(ldraw_lib__4_4con13(), step=step, col=col, unit=unit, alt=alt, line=line, solid=solid);
ldraw_lib__4_4con13(line=0.2);
// main file
use <../lib.scad>
use <../p/4-4con13.scad>
use <../p/4-4con14.scad>
use <../p/4-4cylo.scad>
use <../p/4-4disc.scad>
use <../p/4-4edge.scad>
function ldraw_lib__u9302() = [
// 0 ~Cylinder Weight Metal for Boat Keel
// 0 Name: u9302.dat
// 0 Author: Max Martin Richter [MMR1988]
// 0 !LDRAW_ORG Part UPDATE 2019-01
// 0 !LICENSE Licensed under CC BY 2.0 and CC BY 4.0 : see CAreadme.txt
// 
// 0 BFC CERTIFY CCW
  [0,"BFC","CERTIFY"],
  [0,"BFC","CCW"],
// 
// 0 !HISTORY 2019-06-28 [PTadmin] Official Update 2019-01
// 
// 
// 1 16 0 0 -55.5 15 0 0 0 0 -15 0 111 0 4-4cylo.dat
  [1,16,0,0,-55.5,15,0,0,0,0,-15,0,111,0, ldraw_lib__4_4cylo()],
// 1 16 0 0 -56.5 1 0 0 0 0 -1 0 -1 0 4-4con13.dat
  [1,16,0,0,-56.5,1,0,0,0,0,-1,0,-1,0, ldraw_lib__4_4con13()],
// 1 16 0 0 -55.5 1 0 0 0 0 -1 0 -1 0 4-4con14.dat
  [1,16,0,0,-55.5,1,0,0,0,0,-1,0,-1,0, ldraw_lib__4_4con14()],
// 1 16 0 0 56.5 1 0 0 0 0 -1 0 1 0 4-4con13.dat
  [1,16,0,0,56.5,1,0,0,0,0,-1,0,1,0, ldraw_lib__4_4con13()],
// 1 16 0 0 55.5 1 0 0 0 0 -1 0 1 0 4-4con14.dat
  [1,16,0,0,55.5,1,0,0,0,0,-1,0,1,0, ldraw_lib__4_4con14()],
// 1 16 0 0 -57.5 13 0 0 0 0 -13 0 1 0 4-4disc.dat
  [1,16,0,0,-57.5,13,0,0,0,0,-13,0,1,0, ldraw_lib__4_4disc()],
// 1 16 0 0 -57.5 13 0 0 0 0 -13 0 1 0 4-4edge.dat
  [1,16,0,0,-57.5,13,0,0,0,0,-13,0,1,0, ldraw_lib__4_4edge()],
// 1 16 0 0 57.5 13 0 0 0 0 -13 0 -1 0 4-4disc.dat
  [1,16,0,0,57.5,13,0,0,0,0,-13,0,-1,0, ldraw_lib__4_4disc()],
// 1 16 0 0 57.5 13 0 0 0 0 -13 0 1 0 4-4edge.dat
  [1,16,0,0,57.5,13,0,0,0,0,-13,0,1,0, ldraw_lib__4_4edge()],
];
module ldraw_lib__u9302(step=0, col=false, unit=2/5, alt=false, line=0.2, solid=!$preview)
    makepoly(ldraw_lib__u9302(), step=step, col=col, unit=unit, alt=alt, line=line, solid=solid);
ldraw_lib__u9302(line=0.2);
